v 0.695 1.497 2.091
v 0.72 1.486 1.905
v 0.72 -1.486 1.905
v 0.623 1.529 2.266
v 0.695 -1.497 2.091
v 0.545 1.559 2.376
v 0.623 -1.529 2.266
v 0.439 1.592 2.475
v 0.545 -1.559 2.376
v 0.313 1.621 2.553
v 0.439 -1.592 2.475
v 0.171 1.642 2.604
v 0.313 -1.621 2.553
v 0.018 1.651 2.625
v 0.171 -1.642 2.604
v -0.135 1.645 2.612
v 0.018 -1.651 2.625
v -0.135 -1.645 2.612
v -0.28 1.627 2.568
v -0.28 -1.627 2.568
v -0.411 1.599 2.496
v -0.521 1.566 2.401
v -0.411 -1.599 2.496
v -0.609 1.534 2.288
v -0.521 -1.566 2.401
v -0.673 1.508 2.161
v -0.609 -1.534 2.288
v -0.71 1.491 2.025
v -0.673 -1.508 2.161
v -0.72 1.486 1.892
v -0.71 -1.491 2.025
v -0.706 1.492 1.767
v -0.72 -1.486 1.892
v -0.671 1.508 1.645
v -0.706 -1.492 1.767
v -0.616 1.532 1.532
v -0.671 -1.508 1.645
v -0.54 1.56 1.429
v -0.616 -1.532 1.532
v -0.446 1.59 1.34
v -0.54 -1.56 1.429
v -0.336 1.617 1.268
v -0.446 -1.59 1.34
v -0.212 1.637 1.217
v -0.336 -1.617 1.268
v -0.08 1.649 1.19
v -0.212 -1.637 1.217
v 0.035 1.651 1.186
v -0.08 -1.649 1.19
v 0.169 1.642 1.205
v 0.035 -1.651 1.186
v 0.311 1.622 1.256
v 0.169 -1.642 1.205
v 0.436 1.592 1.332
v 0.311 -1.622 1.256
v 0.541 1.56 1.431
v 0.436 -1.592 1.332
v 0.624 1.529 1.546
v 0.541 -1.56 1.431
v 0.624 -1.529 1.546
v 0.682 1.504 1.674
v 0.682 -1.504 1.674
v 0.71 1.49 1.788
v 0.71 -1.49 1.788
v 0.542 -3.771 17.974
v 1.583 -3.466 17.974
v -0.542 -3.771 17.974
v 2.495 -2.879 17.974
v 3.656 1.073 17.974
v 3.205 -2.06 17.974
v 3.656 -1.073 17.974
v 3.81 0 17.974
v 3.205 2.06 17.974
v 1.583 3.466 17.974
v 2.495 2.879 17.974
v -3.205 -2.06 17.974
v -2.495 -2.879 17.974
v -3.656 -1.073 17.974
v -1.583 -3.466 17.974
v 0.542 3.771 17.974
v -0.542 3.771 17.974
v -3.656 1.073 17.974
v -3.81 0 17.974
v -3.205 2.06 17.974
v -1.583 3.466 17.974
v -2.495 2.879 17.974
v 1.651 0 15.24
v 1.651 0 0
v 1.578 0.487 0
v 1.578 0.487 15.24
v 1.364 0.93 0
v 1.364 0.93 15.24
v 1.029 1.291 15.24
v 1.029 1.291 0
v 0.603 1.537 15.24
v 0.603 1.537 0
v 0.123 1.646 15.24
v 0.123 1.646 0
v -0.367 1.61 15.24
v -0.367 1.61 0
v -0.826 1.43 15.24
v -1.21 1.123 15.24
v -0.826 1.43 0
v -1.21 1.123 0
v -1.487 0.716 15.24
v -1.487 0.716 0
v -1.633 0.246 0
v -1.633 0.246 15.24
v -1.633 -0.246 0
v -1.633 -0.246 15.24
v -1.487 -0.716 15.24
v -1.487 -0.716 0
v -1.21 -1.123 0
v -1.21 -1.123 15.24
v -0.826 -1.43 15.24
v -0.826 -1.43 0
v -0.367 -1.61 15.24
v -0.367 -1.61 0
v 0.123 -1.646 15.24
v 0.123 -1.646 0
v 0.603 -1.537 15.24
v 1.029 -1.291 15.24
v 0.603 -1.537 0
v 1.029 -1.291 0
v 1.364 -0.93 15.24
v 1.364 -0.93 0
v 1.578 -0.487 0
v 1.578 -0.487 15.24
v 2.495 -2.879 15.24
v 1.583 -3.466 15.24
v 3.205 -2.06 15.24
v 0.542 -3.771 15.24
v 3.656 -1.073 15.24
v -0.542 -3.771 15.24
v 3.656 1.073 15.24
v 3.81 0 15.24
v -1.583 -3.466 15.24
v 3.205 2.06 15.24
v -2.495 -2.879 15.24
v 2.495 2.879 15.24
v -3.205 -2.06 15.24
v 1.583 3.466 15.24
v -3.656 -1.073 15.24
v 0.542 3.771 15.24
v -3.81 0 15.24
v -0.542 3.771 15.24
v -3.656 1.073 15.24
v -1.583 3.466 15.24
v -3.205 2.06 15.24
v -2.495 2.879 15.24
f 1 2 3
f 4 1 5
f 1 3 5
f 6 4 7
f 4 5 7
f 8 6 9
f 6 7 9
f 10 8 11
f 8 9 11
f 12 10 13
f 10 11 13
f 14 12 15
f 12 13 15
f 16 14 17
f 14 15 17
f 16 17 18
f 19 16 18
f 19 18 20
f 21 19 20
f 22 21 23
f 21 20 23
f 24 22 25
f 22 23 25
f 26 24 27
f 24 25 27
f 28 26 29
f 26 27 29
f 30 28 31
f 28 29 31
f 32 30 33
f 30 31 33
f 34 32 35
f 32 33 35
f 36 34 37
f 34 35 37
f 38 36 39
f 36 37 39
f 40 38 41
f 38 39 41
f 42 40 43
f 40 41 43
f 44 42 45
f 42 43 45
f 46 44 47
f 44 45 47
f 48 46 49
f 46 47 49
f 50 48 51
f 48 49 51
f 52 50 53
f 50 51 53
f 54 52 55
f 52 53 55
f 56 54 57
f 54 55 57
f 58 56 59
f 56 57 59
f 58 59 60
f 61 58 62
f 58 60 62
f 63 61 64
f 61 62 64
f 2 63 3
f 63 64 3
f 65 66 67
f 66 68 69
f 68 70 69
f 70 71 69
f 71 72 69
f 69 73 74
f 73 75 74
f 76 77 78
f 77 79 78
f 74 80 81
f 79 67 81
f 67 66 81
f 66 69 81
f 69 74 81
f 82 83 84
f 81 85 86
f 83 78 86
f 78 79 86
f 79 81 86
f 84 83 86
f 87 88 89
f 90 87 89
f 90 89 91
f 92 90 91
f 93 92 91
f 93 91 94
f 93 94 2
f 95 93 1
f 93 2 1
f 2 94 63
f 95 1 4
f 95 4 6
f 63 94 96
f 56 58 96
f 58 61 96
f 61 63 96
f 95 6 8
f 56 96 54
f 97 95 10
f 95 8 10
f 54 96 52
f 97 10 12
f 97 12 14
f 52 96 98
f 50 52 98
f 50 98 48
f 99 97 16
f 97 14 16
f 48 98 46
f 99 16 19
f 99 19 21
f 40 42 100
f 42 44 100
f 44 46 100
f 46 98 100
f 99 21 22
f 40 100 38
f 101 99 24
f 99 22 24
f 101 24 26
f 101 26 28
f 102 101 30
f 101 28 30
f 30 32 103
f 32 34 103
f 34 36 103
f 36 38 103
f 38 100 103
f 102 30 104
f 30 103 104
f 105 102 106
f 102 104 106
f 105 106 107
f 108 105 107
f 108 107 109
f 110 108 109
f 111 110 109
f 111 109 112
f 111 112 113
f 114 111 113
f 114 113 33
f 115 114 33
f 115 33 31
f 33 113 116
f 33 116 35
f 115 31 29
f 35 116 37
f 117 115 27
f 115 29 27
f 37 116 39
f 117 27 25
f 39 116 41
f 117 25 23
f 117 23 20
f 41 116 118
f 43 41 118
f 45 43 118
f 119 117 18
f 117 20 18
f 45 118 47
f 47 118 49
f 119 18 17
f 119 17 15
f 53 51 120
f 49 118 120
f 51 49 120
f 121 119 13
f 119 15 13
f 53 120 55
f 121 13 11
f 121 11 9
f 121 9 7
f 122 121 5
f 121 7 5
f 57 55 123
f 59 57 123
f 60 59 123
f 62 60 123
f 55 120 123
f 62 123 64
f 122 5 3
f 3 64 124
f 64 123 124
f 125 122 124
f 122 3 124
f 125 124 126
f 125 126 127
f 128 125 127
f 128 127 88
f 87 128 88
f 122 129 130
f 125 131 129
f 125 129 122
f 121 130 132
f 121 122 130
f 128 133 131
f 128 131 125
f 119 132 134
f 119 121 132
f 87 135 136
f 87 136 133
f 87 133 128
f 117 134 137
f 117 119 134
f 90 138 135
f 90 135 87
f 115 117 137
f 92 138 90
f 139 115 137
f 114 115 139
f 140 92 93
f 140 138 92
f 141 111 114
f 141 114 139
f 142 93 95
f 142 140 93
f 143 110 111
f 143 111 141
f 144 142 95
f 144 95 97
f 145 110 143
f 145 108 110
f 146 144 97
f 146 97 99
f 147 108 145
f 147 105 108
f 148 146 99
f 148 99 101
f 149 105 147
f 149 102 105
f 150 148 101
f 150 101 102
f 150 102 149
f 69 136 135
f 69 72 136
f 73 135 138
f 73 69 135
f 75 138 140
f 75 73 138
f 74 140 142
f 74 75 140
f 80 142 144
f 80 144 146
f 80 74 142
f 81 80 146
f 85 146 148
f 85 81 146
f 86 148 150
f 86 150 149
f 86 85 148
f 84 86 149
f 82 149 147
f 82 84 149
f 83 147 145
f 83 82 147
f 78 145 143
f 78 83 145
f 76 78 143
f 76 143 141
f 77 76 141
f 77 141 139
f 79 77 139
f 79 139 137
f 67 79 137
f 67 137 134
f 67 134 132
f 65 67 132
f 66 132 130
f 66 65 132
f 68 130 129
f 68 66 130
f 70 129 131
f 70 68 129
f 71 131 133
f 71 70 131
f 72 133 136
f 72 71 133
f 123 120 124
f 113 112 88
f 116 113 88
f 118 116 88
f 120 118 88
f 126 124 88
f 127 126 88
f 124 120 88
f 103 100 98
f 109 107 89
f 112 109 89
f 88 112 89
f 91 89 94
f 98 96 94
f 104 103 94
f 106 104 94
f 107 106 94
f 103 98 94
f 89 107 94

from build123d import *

# Parameters (mm, degrees)
F0_R     = 1.651
F1_DEPTH = 15.24
F2_W     = 3.81
F2_H     = 2.733839
F4_R     = 0.719831
F5_DEPTH = 3.811
F6_DEPTH = 3.811


with BuildPart() as f1:
    # F0 (on Top) → F1 (new body)
    with BuildSketch(Plane.XY):
        Circle(F0_R)
    extrude(amount=F1_DEPTH)

    # F2 (on Front) → F3 (revolve)
    with BuildSketch(Plane.XZ):
        with Locations((1.905, 16.606919)):
            Rectangle(F2_W, F2_H)
    revolve(axis=Axis((0, 0, 16.606919), (0, 0, 1)))

    # F4 (on Front) → F5 (cut, through all)
    with BuildSketch(Plane.XZ):
        with Locations((0, 1.905)):
            Circle(F4_R)
    extrude(amount=-F5_DEPTH, mode=Mode.SUBTRACT)

    # F4 (on Front) → F6 (cut, through all)
    with BuildSketch(Plane.XZ):
        with Locations((0, 1.905)):
            Circle(F4_R)
    extrude(amount=F6_DEPTH, mode=Mode.SUBTRACT)


solid = f1.part
